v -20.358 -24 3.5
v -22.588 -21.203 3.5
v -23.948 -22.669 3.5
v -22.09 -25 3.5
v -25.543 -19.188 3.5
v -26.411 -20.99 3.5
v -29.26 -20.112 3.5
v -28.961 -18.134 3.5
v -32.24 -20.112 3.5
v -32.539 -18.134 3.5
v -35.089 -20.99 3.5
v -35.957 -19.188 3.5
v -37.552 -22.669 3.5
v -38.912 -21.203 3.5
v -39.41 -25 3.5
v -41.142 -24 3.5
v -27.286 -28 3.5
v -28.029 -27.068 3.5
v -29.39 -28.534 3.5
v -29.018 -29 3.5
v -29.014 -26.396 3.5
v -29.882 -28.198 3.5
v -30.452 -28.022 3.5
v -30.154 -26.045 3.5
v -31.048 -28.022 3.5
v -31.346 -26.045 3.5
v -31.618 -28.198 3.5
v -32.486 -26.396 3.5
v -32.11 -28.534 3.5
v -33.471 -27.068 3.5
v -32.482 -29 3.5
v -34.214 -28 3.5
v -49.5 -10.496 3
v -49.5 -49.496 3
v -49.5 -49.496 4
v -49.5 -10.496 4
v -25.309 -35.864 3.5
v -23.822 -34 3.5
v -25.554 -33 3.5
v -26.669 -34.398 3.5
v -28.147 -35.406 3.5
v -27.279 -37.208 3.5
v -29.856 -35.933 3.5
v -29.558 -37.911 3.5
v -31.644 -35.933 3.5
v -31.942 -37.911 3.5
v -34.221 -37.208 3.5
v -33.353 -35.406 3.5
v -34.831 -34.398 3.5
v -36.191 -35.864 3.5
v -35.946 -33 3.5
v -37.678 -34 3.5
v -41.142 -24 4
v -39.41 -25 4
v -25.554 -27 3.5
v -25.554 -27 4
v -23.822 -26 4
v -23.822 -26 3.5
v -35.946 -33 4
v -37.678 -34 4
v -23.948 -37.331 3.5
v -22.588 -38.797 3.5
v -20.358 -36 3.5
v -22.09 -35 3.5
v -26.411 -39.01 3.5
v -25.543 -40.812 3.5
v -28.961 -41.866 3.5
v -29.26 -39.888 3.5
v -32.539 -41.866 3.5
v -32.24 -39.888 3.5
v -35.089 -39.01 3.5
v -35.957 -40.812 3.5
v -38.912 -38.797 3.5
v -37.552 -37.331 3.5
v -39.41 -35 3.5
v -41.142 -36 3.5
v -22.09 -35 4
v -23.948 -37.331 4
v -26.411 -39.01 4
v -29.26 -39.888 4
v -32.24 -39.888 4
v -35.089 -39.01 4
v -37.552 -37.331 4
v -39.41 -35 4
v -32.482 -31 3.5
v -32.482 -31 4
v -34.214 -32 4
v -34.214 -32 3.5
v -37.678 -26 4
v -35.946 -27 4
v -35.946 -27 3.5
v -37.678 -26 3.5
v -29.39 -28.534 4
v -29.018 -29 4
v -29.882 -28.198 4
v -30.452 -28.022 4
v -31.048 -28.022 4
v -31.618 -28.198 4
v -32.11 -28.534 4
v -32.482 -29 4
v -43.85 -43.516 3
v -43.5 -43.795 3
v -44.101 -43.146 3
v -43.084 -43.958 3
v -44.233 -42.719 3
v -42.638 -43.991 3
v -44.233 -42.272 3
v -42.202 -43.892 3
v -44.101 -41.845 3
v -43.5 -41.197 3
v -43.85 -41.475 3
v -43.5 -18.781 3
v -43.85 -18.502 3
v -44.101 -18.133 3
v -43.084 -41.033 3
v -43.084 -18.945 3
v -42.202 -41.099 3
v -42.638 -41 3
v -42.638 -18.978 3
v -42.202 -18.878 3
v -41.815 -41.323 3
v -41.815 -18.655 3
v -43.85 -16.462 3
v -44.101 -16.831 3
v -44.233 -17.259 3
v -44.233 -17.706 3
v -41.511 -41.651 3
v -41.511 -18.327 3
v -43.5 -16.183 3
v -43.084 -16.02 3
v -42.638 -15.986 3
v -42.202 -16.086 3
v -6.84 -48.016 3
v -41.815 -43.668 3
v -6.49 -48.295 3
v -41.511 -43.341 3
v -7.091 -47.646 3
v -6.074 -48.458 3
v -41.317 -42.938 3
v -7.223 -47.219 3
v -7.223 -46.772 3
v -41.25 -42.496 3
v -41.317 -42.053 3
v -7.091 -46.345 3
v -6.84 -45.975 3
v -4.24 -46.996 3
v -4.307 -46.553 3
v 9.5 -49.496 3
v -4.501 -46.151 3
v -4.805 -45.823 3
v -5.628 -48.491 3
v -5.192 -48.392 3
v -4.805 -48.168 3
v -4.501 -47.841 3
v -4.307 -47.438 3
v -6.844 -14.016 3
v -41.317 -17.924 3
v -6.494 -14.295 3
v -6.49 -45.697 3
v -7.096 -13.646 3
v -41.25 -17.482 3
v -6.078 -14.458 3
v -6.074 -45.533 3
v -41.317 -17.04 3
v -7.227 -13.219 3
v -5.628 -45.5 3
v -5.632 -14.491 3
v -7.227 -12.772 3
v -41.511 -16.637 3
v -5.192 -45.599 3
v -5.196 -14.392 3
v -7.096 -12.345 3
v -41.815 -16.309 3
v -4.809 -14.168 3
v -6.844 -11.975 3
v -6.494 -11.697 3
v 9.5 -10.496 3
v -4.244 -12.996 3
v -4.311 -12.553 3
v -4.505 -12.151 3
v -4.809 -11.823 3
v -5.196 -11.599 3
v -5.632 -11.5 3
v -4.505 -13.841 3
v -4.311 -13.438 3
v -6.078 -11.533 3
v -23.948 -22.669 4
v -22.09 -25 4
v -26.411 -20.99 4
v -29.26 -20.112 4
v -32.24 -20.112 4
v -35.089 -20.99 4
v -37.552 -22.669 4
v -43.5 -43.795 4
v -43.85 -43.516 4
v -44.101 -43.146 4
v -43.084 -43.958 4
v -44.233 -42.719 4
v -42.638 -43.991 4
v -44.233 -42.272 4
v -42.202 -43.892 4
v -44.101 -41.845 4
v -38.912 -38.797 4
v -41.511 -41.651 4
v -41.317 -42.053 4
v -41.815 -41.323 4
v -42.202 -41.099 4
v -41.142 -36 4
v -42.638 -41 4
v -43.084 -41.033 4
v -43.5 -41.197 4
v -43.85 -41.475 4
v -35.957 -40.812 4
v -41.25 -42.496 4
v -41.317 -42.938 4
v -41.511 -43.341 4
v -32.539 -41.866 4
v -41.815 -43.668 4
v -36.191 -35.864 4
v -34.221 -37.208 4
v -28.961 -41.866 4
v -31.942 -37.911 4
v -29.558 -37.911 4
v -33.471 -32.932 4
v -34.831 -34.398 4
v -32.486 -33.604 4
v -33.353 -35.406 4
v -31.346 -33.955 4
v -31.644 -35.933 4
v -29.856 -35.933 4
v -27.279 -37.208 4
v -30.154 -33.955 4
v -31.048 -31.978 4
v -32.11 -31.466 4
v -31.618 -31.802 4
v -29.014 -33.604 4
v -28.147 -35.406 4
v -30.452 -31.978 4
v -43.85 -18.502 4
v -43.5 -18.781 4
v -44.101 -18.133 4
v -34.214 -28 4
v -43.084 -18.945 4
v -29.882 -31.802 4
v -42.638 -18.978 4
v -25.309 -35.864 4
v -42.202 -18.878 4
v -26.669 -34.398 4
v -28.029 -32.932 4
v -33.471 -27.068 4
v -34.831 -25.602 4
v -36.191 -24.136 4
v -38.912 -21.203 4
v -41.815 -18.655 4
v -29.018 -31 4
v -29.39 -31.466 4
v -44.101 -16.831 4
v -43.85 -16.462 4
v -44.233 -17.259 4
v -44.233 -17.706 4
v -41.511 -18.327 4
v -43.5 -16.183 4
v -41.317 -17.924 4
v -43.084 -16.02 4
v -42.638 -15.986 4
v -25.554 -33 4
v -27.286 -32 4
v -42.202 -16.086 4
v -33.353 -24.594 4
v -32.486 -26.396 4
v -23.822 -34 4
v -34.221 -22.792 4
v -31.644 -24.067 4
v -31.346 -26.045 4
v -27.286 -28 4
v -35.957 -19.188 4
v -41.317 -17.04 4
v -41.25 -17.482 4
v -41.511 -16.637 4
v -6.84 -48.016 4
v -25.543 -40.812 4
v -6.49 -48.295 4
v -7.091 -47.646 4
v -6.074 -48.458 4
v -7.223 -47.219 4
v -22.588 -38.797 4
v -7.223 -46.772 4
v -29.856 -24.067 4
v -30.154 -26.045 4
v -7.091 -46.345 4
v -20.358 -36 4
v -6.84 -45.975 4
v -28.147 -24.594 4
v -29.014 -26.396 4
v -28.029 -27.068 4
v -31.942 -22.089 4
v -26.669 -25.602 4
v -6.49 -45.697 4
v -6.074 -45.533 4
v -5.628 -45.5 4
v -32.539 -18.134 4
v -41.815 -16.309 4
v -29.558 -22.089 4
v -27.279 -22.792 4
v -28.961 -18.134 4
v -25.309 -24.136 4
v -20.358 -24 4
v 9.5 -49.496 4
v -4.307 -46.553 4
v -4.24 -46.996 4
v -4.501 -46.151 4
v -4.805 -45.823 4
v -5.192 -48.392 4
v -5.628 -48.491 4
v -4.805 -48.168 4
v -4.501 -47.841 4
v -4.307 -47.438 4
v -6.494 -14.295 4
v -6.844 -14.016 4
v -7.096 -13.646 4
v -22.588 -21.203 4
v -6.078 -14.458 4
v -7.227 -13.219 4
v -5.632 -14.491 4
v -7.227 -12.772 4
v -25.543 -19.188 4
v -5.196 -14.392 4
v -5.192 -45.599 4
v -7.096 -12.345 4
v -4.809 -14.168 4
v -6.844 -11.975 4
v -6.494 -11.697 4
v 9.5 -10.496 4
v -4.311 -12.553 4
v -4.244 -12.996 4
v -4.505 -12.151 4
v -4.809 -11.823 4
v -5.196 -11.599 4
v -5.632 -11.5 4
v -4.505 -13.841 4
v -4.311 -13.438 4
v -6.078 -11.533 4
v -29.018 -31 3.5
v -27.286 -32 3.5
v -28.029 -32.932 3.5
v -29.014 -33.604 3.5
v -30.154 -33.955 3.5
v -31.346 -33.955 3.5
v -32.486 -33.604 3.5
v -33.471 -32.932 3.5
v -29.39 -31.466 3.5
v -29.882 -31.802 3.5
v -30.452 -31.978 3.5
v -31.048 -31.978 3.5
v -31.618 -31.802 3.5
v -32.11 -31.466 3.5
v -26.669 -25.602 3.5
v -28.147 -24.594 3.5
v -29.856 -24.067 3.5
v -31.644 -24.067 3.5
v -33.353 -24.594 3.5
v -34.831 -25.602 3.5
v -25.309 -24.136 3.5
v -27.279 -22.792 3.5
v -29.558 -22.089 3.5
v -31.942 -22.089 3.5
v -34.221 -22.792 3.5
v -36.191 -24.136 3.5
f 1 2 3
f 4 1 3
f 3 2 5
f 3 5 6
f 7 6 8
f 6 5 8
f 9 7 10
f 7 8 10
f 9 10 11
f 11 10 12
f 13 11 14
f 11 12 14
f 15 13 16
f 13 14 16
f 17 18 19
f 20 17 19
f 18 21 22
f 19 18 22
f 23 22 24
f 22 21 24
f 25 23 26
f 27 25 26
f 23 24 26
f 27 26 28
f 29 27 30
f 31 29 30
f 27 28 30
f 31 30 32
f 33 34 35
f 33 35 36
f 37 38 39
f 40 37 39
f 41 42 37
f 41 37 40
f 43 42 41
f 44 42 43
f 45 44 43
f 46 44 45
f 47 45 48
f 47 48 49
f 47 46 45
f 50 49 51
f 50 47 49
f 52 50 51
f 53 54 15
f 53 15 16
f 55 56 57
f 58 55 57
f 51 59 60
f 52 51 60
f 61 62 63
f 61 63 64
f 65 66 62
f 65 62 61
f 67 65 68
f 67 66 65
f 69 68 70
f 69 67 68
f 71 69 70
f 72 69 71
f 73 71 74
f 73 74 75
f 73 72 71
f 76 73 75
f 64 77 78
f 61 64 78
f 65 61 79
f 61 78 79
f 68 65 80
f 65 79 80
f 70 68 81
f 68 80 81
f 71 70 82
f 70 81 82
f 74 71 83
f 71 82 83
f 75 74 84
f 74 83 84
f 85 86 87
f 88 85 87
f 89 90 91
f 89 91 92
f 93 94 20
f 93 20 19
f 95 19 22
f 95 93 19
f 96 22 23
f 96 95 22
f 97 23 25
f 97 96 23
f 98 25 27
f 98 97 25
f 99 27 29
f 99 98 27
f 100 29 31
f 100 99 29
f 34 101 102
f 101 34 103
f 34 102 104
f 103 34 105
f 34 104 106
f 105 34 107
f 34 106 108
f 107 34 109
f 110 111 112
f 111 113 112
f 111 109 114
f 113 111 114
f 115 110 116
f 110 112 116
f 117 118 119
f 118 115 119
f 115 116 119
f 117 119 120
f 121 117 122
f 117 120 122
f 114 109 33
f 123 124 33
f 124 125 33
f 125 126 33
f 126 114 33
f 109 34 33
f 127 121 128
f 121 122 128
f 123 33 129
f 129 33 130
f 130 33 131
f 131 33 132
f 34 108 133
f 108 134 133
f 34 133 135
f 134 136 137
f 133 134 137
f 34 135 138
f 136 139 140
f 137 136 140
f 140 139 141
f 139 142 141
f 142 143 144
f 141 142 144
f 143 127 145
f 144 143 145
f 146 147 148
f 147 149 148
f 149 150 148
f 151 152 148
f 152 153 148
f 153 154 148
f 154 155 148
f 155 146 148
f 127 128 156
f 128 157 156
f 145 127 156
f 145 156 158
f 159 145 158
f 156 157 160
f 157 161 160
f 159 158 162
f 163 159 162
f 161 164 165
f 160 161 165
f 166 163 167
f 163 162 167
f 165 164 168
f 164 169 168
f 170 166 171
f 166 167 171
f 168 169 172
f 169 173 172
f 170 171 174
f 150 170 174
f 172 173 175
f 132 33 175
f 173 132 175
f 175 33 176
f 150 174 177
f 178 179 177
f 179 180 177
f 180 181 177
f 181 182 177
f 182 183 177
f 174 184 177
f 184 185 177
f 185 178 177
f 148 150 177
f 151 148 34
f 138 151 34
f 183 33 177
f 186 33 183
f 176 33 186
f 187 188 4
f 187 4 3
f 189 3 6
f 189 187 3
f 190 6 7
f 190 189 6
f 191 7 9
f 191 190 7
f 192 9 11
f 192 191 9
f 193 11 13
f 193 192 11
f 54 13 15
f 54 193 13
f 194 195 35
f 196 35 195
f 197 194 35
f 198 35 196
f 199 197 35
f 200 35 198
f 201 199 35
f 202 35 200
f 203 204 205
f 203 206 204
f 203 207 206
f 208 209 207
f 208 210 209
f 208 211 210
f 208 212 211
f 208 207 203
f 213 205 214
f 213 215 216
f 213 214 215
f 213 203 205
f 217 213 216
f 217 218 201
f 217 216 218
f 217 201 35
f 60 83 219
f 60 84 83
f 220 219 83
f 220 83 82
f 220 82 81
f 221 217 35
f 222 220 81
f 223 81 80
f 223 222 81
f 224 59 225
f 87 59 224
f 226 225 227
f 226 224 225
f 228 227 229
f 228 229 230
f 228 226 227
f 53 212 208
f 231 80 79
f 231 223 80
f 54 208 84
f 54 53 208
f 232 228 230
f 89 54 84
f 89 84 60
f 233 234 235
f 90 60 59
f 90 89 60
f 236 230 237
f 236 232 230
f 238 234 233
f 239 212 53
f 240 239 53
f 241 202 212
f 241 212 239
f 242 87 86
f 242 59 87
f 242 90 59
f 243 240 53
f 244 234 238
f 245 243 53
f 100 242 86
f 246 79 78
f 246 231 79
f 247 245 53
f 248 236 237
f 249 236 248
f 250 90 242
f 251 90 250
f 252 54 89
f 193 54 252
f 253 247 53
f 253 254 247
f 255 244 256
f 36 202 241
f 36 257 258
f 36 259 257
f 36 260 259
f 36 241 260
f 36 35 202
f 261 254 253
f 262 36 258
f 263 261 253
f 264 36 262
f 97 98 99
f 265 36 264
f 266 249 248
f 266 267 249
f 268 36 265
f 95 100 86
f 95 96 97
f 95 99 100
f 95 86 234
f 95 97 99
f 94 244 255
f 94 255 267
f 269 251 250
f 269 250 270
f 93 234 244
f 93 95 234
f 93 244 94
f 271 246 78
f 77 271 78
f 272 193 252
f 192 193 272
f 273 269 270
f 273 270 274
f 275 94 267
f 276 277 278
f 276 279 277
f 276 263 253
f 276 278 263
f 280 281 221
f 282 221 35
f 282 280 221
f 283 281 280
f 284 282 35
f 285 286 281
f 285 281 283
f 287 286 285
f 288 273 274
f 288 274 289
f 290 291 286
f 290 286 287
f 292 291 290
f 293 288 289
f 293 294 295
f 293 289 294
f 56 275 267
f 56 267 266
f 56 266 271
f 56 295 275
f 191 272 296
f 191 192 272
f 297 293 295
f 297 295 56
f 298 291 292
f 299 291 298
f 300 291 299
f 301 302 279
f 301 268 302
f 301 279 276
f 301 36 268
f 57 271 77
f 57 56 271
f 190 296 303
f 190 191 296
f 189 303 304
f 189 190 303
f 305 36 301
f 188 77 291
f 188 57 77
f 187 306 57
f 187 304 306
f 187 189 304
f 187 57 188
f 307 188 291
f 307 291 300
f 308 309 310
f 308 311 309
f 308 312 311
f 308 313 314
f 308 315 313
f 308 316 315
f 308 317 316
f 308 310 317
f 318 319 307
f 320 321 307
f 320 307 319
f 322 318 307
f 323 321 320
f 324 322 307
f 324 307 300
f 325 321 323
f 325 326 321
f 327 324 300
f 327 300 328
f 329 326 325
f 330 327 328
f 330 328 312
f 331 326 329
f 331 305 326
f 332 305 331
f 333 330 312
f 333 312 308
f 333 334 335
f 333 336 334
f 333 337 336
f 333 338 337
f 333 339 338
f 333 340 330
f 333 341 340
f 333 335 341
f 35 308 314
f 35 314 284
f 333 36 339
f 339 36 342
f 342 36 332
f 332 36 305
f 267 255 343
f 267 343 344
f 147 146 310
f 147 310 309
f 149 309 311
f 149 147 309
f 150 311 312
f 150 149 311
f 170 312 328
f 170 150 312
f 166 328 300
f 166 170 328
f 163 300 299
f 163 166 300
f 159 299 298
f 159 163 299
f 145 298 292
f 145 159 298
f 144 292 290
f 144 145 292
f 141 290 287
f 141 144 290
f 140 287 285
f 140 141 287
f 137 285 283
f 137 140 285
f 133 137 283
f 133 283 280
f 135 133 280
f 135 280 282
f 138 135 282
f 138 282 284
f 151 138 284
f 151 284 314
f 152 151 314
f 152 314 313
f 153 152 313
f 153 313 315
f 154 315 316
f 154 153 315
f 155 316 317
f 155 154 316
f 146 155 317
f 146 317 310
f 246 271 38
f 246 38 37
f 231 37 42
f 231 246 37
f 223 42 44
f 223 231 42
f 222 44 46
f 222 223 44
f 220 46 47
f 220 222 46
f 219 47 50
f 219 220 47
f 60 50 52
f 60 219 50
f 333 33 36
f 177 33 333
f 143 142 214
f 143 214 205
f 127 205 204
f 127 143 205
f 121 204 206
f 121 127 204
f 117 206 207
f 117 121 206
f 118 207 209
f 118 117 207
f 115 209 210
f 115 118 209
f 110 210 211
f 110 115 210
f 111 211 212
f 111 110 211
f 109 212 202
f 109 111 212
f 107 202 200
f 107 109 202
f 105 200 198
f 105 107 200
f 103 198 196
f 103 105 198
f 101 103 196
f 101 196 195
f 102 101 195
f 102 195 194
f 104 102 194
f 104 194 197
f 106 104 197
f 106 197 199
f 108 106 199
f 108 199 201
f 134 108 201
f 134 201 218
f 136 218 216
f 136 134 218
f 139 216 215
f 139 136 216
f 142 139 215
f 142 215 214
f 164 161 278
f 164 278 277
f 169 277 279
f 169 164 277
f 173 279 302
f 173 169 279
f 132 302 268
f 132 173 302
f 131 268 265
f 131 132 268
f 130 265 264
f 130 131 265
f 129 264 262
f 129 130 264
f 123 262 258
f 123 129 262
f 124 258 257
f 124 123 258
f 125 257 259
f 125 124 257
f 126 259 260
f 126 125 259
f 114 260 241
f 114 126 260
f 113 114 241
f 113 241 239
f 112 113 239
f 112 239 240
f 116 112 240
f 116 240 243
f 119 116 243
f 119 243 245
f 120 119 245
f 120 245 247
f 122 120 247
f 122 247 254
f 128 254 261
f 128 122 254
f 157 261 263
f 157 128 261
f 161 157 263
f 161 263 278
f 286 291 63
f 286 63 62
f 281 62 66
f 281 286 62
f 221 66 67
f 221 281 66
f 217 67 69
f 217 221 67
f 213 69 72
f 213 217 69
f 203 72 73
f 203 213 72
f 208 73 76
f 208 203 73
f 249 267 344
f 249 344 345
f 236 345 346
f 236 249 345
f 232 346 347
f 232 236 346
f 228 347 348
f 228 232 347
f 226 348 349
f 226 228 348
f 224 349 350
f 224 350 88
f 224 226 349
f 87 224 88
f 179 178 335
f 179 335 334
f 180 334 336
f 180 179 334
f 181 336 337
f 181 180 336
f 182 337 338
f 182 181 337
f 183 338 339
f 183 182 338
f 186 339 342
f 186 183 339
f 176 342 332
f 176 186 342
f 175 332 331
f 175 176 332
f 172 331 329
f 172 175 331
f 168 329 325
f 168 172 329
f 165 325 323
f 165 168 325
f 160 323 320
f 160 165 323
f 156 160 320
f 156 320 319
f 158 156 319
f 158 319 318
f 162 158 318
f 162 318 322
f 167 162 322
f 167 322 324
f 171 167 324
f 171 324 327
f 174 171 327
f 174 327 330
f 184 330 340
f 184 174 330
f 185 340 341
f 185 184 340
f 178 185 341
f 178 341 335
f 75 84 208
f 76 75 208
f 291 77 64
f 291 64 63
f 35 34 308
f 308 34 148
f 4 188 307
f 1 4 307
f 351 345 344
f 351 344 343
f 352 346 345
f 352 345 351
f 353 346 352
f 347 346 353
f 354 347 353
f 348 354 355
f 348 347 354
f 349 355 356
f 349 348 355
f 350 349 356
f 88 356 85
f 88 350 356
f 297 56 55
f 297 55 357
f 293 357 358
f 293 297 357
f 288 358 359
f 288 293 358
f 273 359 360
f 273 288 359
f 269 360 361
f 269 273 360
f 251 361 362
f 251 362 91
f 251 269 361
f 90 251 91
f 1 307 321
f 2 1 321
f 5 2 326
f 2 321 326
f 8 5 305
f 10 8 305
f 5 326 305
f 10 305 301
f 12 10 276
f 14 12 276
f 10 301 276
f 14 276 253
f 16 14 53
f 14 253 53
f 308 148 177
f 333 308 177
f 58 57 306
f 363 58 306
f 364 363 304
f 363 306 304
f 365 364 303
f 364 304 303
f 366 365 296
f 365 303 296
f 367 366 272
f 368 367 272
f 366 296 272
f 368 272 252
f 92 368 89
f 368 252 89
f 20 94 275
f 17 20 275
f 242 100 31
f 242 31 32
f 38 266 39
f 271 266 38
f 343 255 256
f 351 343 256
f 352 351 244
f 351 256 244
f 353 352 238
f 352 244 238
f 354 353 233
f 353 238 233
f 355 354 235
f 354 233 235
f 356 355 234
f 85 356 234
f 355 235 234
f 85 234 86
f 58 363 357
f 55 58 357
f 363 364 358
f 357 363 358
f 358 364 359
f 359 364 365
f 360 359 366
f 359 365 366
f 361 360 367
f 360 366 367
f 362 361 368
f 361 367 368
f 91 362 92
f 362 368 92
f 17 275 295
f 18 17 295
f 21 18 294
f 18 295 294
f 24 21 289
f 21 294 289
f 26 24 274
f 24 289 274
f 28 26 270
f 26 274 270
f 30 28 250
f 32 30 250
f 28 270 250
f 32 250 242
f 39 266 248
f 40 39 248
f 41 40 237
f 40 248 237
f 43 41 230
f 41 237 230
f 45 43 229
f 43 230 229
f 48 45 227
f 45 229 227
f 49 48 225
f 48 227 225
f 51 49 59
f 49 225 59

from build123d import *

# Parameters (mm, degrees)
CYLINDER011_W               = 6
CYLINDER011_H               = 10
CYLINDER011_ANGLE           = 120
CYLINDER011_PLACEMENT_ANGLE = 30
CYLINDER010_W               = 8
CYLINDER010_H               = 10
CYLINDER010_ANGLE           = 120
CYLINDER010_PLACEMENT_ANGLE = 30
CYLINDER009_W               = 2
CYLINDER009_H               = 10
CYLINDER009_ANGLE           = 120
CYLINDER009_PLACEMENT_ANGLE = 30
CYLINDER008_W               = 4
CYLINDER008_H               = 10
CYLINDER008_ANGLE           = 120
CYLINDER008_PLACEMENT_ANGLE = 30
CYLINDER013_W               = 10
CYLINDER013_H               = 10
CYLINDER013_ANGLE           = 120
CYLINDER013_PLACEMENT_ANGLE = 30
CYLINDER012_W               = 12
CYLINDER012_H               = 10
CYLINDER012_ANGLE           = 120
CYLINDER012_PLACEMENT_ANGLE = 30
SKETCH003_W                 = 59
SKETCH003_H                 = 39
SKETCH003_R                 = 1.5
EXTRUDE002_DEPTH            = 1


with BuildPart() as cilindro003:
    # Cylinder011 → Cylinder011 (revolve)
    with BuildSketch(Plane.XZ):
        with Locations((3, 5)):
            Rectangle(CYLINDER011_W, CYLINDER011_H)
    revolve(axis=Axis((0, 0, 0), (0, 0, 1)), revolution_arc=CYLINDER011_ANGLE)


with BuildPart() as cilindro003_1:
    # Cylinder011 placement: moved
    add(cilindro003.part.moved(Location((-30.75, -30, 0))).rotate(Axis((-30.75, -30, 0), (0, 0, 1)), CYLINDER011_PLACEMENT_ANGLE))


with BuildPart() as inalambrico_medio:
    # Cylinder010 → Cylinder010 (revolve)
    with BuildSketch(Plane.XZ):
        with Locations((4, 5)):
            Rectangle(CYLINDER010_W, CYLINDER010_H)
    revolve(axis=Axis((0, 0, 0), (0, 0, 1)), revolution_arc=CYLINDER010_ANGLE)


with BuildPart() as inalambrico_medio_1:
    # Cylinder010 placement: moved
    add(inalambrico_medio.part.moved(Location((-30.75, -30, 0))).rotate(Axis((-30.75, -30, 0), (0, 0, 1)), CYLINDER010_PLACEMENT_ANGLE))

    # Cut001: cut Cilindro003
    add(cilindro003_1.part, mode=Mode.SUBTRACT)


with BuildPart() as cilindro001:
    # Cylinder009 → Cylinder009 (revolve)
    with BuildSketch(Plane.XZ):
        with Locations((1, 5)):
            Rectangle(CYLINDER009_W, CYLINDER009_H)
    revolve(axis=Axis((0, 0, 0), (0, 0, 1)), revolution_arc=CYLINDER009_ANGLE)


with BuildPart() as cilindro001_1:
    # Cylinder009 placement: moved
    add(cilindro001.part.moved(Location((-30.75, -30, 0))).rotate(Axis((-30.75, -30, 0), (0, 0, 1)), CYLINDER009_PLACEMENT_ANGLE))


with BuildPart() as inalambrico_peque_o:
    # Cylinder008 → Cylinder008 (revolve)
    with BuildSketch(Plane.XZ):
        with Locations((2, 5)):
            Rectangle(CYLINDER008_W, CYLINDER008_H)
    revolve(axis=Axis((0, 0, 0), (0, 0, 1)), revolution_arc=CYLINDER008_ANGLE)


with BuildPart() as inalambrico_peque_o_1:
    # Cylinder008 placement: moved
    add(inalambrico_peque_o.part.moved(Location((-30.75, -30, 0))).rotate(Axis((-30.75, -30, 0), (0, 0, 1)), CYLINDER008_PLACEMENT_ANGLE))

    # Cut: cut Cilindro001
    add(cilindro001_1.part, mode=Mode.SUBTRACT)


with BuildPart() as cilindro005:
    # Cylinder013 → Cylinder013 (revolve)
    with BuildSketch(Plane.XZ):
        with Locations((5, 5)):
            Rectangle(CYLINDER013_W, CYLINDER013_H)
    revolve(axis=Axis((0, 0, 0), (0, 0, 1)), revolution_arc=CYLINDER013_ANGLE)


with BuildPart() as cilindro005_1:
    # Cylinder013 placement: moved
    add(cilindro005.part.moved(Location((-30.75, -30, 0))).rotate(Axis((-30.75, -30, 0), (0, 0, 1)), CYLINDER013_PLACEMENT_ANGLE))


with BuildPart() as fusion:
    # Cylinder012 → Cylinder012 (revolve)
    with BuildSketch(Plane.XZ):
        with Locations((6, 5)):
            Rectangle(CYLINDER012_W, CYLINDER012_H)
    revolve(axis=Axis((0, 0, 0), (0, 0, 1)), revolution_arc=CYLINDER012_ANGLE)


with BuildPart() as fusion_1:
    # Cylinder012 placement: moved
    add(fusion.part.moved(Location((-30.75, -30, 0))).rotate(Axis((-30.75, -30, 0), (0, 0, 1)), CYLINDER012_PLACEMENT_ANGLE))

    # Cut002: cut Cilindro005
    add(cilindro005_1.part, mode=Mode.SUBTRACT)

    # Fusion: union inalambrico_medio, inalambrico_pequeño
    add(inalambrico_medio_1.part)
    add(inalambrico_peque_o_1.part)


with BuildPart() as fusion_2:
    # Fusion placement: moved
    add(fusion_1.part.moved(Location((0, 0, -6))))


with BuildPart() as simbolo_wifi_clon:
    # Part__Mirroring: instance of Fusion
    add(fusion_2.part.mirror(Plane(origin=(0, 0, 0), x_dir=(1, 0, 0), z_dir=(0, 1, 0))))


with BuildPart() as simbolo_wifi_clon_1:
    # Part__Mirroring placement: moved
    add(simbolo_wifi_clon.part.moved(Location((0, -60, 0))))

    # Fusion006: union Fusion
    add(fusion_2.part)


with BuildPart() as simbolo_wifi_clon_2:
    # Clone placement: moved
    add(simbolo_wifi_clon_1.part.moved(Location((0, 0, 9.5))))


with BuildPart() as pcb_rfid_con_logo_wifi:
    # Sketch003 → Extrude002 (new body)
    with BuildSketch(Plane.XY):
        with Locations((-20, -29.995631)):
            Rectangle(SKETCH003_W, SKETCH003_H)
        with Locations((-5.744241, -12.995631)):
            Circle(SKETCH003_R, mode=Mode.SUBTRACT)
        with Locations((-42.75, -17.482117)):
            Circle(SKETCH003_R, mode=Mode.SUBTRACT)
        with Locations((-42.75, -42.495631)):
            Circle(SKETCH003_R, mode=Mode.SUBTRACT)
        with Locations((-5.74, -46.995631)):
            Circle(SKETCH003_R, mode=Mode.SUBTRACT)
    extrude(amount=EXTRUDE002_DEPTH)


with BuildPart() as pcb_rfid_con_logo_wifi_1:
    # Extrude002 placement: moved
    add(pcb_rfid_con_logo_wifi.part.moved(Location((0, 0, 3))))

    # Cut011: cut simbolo wifi clon
    add(simbolo_wifi_clon_2.part, mode=Mode.SUBTRACT)


solid = pcb_rfid_con_logo_wifi_1.part
